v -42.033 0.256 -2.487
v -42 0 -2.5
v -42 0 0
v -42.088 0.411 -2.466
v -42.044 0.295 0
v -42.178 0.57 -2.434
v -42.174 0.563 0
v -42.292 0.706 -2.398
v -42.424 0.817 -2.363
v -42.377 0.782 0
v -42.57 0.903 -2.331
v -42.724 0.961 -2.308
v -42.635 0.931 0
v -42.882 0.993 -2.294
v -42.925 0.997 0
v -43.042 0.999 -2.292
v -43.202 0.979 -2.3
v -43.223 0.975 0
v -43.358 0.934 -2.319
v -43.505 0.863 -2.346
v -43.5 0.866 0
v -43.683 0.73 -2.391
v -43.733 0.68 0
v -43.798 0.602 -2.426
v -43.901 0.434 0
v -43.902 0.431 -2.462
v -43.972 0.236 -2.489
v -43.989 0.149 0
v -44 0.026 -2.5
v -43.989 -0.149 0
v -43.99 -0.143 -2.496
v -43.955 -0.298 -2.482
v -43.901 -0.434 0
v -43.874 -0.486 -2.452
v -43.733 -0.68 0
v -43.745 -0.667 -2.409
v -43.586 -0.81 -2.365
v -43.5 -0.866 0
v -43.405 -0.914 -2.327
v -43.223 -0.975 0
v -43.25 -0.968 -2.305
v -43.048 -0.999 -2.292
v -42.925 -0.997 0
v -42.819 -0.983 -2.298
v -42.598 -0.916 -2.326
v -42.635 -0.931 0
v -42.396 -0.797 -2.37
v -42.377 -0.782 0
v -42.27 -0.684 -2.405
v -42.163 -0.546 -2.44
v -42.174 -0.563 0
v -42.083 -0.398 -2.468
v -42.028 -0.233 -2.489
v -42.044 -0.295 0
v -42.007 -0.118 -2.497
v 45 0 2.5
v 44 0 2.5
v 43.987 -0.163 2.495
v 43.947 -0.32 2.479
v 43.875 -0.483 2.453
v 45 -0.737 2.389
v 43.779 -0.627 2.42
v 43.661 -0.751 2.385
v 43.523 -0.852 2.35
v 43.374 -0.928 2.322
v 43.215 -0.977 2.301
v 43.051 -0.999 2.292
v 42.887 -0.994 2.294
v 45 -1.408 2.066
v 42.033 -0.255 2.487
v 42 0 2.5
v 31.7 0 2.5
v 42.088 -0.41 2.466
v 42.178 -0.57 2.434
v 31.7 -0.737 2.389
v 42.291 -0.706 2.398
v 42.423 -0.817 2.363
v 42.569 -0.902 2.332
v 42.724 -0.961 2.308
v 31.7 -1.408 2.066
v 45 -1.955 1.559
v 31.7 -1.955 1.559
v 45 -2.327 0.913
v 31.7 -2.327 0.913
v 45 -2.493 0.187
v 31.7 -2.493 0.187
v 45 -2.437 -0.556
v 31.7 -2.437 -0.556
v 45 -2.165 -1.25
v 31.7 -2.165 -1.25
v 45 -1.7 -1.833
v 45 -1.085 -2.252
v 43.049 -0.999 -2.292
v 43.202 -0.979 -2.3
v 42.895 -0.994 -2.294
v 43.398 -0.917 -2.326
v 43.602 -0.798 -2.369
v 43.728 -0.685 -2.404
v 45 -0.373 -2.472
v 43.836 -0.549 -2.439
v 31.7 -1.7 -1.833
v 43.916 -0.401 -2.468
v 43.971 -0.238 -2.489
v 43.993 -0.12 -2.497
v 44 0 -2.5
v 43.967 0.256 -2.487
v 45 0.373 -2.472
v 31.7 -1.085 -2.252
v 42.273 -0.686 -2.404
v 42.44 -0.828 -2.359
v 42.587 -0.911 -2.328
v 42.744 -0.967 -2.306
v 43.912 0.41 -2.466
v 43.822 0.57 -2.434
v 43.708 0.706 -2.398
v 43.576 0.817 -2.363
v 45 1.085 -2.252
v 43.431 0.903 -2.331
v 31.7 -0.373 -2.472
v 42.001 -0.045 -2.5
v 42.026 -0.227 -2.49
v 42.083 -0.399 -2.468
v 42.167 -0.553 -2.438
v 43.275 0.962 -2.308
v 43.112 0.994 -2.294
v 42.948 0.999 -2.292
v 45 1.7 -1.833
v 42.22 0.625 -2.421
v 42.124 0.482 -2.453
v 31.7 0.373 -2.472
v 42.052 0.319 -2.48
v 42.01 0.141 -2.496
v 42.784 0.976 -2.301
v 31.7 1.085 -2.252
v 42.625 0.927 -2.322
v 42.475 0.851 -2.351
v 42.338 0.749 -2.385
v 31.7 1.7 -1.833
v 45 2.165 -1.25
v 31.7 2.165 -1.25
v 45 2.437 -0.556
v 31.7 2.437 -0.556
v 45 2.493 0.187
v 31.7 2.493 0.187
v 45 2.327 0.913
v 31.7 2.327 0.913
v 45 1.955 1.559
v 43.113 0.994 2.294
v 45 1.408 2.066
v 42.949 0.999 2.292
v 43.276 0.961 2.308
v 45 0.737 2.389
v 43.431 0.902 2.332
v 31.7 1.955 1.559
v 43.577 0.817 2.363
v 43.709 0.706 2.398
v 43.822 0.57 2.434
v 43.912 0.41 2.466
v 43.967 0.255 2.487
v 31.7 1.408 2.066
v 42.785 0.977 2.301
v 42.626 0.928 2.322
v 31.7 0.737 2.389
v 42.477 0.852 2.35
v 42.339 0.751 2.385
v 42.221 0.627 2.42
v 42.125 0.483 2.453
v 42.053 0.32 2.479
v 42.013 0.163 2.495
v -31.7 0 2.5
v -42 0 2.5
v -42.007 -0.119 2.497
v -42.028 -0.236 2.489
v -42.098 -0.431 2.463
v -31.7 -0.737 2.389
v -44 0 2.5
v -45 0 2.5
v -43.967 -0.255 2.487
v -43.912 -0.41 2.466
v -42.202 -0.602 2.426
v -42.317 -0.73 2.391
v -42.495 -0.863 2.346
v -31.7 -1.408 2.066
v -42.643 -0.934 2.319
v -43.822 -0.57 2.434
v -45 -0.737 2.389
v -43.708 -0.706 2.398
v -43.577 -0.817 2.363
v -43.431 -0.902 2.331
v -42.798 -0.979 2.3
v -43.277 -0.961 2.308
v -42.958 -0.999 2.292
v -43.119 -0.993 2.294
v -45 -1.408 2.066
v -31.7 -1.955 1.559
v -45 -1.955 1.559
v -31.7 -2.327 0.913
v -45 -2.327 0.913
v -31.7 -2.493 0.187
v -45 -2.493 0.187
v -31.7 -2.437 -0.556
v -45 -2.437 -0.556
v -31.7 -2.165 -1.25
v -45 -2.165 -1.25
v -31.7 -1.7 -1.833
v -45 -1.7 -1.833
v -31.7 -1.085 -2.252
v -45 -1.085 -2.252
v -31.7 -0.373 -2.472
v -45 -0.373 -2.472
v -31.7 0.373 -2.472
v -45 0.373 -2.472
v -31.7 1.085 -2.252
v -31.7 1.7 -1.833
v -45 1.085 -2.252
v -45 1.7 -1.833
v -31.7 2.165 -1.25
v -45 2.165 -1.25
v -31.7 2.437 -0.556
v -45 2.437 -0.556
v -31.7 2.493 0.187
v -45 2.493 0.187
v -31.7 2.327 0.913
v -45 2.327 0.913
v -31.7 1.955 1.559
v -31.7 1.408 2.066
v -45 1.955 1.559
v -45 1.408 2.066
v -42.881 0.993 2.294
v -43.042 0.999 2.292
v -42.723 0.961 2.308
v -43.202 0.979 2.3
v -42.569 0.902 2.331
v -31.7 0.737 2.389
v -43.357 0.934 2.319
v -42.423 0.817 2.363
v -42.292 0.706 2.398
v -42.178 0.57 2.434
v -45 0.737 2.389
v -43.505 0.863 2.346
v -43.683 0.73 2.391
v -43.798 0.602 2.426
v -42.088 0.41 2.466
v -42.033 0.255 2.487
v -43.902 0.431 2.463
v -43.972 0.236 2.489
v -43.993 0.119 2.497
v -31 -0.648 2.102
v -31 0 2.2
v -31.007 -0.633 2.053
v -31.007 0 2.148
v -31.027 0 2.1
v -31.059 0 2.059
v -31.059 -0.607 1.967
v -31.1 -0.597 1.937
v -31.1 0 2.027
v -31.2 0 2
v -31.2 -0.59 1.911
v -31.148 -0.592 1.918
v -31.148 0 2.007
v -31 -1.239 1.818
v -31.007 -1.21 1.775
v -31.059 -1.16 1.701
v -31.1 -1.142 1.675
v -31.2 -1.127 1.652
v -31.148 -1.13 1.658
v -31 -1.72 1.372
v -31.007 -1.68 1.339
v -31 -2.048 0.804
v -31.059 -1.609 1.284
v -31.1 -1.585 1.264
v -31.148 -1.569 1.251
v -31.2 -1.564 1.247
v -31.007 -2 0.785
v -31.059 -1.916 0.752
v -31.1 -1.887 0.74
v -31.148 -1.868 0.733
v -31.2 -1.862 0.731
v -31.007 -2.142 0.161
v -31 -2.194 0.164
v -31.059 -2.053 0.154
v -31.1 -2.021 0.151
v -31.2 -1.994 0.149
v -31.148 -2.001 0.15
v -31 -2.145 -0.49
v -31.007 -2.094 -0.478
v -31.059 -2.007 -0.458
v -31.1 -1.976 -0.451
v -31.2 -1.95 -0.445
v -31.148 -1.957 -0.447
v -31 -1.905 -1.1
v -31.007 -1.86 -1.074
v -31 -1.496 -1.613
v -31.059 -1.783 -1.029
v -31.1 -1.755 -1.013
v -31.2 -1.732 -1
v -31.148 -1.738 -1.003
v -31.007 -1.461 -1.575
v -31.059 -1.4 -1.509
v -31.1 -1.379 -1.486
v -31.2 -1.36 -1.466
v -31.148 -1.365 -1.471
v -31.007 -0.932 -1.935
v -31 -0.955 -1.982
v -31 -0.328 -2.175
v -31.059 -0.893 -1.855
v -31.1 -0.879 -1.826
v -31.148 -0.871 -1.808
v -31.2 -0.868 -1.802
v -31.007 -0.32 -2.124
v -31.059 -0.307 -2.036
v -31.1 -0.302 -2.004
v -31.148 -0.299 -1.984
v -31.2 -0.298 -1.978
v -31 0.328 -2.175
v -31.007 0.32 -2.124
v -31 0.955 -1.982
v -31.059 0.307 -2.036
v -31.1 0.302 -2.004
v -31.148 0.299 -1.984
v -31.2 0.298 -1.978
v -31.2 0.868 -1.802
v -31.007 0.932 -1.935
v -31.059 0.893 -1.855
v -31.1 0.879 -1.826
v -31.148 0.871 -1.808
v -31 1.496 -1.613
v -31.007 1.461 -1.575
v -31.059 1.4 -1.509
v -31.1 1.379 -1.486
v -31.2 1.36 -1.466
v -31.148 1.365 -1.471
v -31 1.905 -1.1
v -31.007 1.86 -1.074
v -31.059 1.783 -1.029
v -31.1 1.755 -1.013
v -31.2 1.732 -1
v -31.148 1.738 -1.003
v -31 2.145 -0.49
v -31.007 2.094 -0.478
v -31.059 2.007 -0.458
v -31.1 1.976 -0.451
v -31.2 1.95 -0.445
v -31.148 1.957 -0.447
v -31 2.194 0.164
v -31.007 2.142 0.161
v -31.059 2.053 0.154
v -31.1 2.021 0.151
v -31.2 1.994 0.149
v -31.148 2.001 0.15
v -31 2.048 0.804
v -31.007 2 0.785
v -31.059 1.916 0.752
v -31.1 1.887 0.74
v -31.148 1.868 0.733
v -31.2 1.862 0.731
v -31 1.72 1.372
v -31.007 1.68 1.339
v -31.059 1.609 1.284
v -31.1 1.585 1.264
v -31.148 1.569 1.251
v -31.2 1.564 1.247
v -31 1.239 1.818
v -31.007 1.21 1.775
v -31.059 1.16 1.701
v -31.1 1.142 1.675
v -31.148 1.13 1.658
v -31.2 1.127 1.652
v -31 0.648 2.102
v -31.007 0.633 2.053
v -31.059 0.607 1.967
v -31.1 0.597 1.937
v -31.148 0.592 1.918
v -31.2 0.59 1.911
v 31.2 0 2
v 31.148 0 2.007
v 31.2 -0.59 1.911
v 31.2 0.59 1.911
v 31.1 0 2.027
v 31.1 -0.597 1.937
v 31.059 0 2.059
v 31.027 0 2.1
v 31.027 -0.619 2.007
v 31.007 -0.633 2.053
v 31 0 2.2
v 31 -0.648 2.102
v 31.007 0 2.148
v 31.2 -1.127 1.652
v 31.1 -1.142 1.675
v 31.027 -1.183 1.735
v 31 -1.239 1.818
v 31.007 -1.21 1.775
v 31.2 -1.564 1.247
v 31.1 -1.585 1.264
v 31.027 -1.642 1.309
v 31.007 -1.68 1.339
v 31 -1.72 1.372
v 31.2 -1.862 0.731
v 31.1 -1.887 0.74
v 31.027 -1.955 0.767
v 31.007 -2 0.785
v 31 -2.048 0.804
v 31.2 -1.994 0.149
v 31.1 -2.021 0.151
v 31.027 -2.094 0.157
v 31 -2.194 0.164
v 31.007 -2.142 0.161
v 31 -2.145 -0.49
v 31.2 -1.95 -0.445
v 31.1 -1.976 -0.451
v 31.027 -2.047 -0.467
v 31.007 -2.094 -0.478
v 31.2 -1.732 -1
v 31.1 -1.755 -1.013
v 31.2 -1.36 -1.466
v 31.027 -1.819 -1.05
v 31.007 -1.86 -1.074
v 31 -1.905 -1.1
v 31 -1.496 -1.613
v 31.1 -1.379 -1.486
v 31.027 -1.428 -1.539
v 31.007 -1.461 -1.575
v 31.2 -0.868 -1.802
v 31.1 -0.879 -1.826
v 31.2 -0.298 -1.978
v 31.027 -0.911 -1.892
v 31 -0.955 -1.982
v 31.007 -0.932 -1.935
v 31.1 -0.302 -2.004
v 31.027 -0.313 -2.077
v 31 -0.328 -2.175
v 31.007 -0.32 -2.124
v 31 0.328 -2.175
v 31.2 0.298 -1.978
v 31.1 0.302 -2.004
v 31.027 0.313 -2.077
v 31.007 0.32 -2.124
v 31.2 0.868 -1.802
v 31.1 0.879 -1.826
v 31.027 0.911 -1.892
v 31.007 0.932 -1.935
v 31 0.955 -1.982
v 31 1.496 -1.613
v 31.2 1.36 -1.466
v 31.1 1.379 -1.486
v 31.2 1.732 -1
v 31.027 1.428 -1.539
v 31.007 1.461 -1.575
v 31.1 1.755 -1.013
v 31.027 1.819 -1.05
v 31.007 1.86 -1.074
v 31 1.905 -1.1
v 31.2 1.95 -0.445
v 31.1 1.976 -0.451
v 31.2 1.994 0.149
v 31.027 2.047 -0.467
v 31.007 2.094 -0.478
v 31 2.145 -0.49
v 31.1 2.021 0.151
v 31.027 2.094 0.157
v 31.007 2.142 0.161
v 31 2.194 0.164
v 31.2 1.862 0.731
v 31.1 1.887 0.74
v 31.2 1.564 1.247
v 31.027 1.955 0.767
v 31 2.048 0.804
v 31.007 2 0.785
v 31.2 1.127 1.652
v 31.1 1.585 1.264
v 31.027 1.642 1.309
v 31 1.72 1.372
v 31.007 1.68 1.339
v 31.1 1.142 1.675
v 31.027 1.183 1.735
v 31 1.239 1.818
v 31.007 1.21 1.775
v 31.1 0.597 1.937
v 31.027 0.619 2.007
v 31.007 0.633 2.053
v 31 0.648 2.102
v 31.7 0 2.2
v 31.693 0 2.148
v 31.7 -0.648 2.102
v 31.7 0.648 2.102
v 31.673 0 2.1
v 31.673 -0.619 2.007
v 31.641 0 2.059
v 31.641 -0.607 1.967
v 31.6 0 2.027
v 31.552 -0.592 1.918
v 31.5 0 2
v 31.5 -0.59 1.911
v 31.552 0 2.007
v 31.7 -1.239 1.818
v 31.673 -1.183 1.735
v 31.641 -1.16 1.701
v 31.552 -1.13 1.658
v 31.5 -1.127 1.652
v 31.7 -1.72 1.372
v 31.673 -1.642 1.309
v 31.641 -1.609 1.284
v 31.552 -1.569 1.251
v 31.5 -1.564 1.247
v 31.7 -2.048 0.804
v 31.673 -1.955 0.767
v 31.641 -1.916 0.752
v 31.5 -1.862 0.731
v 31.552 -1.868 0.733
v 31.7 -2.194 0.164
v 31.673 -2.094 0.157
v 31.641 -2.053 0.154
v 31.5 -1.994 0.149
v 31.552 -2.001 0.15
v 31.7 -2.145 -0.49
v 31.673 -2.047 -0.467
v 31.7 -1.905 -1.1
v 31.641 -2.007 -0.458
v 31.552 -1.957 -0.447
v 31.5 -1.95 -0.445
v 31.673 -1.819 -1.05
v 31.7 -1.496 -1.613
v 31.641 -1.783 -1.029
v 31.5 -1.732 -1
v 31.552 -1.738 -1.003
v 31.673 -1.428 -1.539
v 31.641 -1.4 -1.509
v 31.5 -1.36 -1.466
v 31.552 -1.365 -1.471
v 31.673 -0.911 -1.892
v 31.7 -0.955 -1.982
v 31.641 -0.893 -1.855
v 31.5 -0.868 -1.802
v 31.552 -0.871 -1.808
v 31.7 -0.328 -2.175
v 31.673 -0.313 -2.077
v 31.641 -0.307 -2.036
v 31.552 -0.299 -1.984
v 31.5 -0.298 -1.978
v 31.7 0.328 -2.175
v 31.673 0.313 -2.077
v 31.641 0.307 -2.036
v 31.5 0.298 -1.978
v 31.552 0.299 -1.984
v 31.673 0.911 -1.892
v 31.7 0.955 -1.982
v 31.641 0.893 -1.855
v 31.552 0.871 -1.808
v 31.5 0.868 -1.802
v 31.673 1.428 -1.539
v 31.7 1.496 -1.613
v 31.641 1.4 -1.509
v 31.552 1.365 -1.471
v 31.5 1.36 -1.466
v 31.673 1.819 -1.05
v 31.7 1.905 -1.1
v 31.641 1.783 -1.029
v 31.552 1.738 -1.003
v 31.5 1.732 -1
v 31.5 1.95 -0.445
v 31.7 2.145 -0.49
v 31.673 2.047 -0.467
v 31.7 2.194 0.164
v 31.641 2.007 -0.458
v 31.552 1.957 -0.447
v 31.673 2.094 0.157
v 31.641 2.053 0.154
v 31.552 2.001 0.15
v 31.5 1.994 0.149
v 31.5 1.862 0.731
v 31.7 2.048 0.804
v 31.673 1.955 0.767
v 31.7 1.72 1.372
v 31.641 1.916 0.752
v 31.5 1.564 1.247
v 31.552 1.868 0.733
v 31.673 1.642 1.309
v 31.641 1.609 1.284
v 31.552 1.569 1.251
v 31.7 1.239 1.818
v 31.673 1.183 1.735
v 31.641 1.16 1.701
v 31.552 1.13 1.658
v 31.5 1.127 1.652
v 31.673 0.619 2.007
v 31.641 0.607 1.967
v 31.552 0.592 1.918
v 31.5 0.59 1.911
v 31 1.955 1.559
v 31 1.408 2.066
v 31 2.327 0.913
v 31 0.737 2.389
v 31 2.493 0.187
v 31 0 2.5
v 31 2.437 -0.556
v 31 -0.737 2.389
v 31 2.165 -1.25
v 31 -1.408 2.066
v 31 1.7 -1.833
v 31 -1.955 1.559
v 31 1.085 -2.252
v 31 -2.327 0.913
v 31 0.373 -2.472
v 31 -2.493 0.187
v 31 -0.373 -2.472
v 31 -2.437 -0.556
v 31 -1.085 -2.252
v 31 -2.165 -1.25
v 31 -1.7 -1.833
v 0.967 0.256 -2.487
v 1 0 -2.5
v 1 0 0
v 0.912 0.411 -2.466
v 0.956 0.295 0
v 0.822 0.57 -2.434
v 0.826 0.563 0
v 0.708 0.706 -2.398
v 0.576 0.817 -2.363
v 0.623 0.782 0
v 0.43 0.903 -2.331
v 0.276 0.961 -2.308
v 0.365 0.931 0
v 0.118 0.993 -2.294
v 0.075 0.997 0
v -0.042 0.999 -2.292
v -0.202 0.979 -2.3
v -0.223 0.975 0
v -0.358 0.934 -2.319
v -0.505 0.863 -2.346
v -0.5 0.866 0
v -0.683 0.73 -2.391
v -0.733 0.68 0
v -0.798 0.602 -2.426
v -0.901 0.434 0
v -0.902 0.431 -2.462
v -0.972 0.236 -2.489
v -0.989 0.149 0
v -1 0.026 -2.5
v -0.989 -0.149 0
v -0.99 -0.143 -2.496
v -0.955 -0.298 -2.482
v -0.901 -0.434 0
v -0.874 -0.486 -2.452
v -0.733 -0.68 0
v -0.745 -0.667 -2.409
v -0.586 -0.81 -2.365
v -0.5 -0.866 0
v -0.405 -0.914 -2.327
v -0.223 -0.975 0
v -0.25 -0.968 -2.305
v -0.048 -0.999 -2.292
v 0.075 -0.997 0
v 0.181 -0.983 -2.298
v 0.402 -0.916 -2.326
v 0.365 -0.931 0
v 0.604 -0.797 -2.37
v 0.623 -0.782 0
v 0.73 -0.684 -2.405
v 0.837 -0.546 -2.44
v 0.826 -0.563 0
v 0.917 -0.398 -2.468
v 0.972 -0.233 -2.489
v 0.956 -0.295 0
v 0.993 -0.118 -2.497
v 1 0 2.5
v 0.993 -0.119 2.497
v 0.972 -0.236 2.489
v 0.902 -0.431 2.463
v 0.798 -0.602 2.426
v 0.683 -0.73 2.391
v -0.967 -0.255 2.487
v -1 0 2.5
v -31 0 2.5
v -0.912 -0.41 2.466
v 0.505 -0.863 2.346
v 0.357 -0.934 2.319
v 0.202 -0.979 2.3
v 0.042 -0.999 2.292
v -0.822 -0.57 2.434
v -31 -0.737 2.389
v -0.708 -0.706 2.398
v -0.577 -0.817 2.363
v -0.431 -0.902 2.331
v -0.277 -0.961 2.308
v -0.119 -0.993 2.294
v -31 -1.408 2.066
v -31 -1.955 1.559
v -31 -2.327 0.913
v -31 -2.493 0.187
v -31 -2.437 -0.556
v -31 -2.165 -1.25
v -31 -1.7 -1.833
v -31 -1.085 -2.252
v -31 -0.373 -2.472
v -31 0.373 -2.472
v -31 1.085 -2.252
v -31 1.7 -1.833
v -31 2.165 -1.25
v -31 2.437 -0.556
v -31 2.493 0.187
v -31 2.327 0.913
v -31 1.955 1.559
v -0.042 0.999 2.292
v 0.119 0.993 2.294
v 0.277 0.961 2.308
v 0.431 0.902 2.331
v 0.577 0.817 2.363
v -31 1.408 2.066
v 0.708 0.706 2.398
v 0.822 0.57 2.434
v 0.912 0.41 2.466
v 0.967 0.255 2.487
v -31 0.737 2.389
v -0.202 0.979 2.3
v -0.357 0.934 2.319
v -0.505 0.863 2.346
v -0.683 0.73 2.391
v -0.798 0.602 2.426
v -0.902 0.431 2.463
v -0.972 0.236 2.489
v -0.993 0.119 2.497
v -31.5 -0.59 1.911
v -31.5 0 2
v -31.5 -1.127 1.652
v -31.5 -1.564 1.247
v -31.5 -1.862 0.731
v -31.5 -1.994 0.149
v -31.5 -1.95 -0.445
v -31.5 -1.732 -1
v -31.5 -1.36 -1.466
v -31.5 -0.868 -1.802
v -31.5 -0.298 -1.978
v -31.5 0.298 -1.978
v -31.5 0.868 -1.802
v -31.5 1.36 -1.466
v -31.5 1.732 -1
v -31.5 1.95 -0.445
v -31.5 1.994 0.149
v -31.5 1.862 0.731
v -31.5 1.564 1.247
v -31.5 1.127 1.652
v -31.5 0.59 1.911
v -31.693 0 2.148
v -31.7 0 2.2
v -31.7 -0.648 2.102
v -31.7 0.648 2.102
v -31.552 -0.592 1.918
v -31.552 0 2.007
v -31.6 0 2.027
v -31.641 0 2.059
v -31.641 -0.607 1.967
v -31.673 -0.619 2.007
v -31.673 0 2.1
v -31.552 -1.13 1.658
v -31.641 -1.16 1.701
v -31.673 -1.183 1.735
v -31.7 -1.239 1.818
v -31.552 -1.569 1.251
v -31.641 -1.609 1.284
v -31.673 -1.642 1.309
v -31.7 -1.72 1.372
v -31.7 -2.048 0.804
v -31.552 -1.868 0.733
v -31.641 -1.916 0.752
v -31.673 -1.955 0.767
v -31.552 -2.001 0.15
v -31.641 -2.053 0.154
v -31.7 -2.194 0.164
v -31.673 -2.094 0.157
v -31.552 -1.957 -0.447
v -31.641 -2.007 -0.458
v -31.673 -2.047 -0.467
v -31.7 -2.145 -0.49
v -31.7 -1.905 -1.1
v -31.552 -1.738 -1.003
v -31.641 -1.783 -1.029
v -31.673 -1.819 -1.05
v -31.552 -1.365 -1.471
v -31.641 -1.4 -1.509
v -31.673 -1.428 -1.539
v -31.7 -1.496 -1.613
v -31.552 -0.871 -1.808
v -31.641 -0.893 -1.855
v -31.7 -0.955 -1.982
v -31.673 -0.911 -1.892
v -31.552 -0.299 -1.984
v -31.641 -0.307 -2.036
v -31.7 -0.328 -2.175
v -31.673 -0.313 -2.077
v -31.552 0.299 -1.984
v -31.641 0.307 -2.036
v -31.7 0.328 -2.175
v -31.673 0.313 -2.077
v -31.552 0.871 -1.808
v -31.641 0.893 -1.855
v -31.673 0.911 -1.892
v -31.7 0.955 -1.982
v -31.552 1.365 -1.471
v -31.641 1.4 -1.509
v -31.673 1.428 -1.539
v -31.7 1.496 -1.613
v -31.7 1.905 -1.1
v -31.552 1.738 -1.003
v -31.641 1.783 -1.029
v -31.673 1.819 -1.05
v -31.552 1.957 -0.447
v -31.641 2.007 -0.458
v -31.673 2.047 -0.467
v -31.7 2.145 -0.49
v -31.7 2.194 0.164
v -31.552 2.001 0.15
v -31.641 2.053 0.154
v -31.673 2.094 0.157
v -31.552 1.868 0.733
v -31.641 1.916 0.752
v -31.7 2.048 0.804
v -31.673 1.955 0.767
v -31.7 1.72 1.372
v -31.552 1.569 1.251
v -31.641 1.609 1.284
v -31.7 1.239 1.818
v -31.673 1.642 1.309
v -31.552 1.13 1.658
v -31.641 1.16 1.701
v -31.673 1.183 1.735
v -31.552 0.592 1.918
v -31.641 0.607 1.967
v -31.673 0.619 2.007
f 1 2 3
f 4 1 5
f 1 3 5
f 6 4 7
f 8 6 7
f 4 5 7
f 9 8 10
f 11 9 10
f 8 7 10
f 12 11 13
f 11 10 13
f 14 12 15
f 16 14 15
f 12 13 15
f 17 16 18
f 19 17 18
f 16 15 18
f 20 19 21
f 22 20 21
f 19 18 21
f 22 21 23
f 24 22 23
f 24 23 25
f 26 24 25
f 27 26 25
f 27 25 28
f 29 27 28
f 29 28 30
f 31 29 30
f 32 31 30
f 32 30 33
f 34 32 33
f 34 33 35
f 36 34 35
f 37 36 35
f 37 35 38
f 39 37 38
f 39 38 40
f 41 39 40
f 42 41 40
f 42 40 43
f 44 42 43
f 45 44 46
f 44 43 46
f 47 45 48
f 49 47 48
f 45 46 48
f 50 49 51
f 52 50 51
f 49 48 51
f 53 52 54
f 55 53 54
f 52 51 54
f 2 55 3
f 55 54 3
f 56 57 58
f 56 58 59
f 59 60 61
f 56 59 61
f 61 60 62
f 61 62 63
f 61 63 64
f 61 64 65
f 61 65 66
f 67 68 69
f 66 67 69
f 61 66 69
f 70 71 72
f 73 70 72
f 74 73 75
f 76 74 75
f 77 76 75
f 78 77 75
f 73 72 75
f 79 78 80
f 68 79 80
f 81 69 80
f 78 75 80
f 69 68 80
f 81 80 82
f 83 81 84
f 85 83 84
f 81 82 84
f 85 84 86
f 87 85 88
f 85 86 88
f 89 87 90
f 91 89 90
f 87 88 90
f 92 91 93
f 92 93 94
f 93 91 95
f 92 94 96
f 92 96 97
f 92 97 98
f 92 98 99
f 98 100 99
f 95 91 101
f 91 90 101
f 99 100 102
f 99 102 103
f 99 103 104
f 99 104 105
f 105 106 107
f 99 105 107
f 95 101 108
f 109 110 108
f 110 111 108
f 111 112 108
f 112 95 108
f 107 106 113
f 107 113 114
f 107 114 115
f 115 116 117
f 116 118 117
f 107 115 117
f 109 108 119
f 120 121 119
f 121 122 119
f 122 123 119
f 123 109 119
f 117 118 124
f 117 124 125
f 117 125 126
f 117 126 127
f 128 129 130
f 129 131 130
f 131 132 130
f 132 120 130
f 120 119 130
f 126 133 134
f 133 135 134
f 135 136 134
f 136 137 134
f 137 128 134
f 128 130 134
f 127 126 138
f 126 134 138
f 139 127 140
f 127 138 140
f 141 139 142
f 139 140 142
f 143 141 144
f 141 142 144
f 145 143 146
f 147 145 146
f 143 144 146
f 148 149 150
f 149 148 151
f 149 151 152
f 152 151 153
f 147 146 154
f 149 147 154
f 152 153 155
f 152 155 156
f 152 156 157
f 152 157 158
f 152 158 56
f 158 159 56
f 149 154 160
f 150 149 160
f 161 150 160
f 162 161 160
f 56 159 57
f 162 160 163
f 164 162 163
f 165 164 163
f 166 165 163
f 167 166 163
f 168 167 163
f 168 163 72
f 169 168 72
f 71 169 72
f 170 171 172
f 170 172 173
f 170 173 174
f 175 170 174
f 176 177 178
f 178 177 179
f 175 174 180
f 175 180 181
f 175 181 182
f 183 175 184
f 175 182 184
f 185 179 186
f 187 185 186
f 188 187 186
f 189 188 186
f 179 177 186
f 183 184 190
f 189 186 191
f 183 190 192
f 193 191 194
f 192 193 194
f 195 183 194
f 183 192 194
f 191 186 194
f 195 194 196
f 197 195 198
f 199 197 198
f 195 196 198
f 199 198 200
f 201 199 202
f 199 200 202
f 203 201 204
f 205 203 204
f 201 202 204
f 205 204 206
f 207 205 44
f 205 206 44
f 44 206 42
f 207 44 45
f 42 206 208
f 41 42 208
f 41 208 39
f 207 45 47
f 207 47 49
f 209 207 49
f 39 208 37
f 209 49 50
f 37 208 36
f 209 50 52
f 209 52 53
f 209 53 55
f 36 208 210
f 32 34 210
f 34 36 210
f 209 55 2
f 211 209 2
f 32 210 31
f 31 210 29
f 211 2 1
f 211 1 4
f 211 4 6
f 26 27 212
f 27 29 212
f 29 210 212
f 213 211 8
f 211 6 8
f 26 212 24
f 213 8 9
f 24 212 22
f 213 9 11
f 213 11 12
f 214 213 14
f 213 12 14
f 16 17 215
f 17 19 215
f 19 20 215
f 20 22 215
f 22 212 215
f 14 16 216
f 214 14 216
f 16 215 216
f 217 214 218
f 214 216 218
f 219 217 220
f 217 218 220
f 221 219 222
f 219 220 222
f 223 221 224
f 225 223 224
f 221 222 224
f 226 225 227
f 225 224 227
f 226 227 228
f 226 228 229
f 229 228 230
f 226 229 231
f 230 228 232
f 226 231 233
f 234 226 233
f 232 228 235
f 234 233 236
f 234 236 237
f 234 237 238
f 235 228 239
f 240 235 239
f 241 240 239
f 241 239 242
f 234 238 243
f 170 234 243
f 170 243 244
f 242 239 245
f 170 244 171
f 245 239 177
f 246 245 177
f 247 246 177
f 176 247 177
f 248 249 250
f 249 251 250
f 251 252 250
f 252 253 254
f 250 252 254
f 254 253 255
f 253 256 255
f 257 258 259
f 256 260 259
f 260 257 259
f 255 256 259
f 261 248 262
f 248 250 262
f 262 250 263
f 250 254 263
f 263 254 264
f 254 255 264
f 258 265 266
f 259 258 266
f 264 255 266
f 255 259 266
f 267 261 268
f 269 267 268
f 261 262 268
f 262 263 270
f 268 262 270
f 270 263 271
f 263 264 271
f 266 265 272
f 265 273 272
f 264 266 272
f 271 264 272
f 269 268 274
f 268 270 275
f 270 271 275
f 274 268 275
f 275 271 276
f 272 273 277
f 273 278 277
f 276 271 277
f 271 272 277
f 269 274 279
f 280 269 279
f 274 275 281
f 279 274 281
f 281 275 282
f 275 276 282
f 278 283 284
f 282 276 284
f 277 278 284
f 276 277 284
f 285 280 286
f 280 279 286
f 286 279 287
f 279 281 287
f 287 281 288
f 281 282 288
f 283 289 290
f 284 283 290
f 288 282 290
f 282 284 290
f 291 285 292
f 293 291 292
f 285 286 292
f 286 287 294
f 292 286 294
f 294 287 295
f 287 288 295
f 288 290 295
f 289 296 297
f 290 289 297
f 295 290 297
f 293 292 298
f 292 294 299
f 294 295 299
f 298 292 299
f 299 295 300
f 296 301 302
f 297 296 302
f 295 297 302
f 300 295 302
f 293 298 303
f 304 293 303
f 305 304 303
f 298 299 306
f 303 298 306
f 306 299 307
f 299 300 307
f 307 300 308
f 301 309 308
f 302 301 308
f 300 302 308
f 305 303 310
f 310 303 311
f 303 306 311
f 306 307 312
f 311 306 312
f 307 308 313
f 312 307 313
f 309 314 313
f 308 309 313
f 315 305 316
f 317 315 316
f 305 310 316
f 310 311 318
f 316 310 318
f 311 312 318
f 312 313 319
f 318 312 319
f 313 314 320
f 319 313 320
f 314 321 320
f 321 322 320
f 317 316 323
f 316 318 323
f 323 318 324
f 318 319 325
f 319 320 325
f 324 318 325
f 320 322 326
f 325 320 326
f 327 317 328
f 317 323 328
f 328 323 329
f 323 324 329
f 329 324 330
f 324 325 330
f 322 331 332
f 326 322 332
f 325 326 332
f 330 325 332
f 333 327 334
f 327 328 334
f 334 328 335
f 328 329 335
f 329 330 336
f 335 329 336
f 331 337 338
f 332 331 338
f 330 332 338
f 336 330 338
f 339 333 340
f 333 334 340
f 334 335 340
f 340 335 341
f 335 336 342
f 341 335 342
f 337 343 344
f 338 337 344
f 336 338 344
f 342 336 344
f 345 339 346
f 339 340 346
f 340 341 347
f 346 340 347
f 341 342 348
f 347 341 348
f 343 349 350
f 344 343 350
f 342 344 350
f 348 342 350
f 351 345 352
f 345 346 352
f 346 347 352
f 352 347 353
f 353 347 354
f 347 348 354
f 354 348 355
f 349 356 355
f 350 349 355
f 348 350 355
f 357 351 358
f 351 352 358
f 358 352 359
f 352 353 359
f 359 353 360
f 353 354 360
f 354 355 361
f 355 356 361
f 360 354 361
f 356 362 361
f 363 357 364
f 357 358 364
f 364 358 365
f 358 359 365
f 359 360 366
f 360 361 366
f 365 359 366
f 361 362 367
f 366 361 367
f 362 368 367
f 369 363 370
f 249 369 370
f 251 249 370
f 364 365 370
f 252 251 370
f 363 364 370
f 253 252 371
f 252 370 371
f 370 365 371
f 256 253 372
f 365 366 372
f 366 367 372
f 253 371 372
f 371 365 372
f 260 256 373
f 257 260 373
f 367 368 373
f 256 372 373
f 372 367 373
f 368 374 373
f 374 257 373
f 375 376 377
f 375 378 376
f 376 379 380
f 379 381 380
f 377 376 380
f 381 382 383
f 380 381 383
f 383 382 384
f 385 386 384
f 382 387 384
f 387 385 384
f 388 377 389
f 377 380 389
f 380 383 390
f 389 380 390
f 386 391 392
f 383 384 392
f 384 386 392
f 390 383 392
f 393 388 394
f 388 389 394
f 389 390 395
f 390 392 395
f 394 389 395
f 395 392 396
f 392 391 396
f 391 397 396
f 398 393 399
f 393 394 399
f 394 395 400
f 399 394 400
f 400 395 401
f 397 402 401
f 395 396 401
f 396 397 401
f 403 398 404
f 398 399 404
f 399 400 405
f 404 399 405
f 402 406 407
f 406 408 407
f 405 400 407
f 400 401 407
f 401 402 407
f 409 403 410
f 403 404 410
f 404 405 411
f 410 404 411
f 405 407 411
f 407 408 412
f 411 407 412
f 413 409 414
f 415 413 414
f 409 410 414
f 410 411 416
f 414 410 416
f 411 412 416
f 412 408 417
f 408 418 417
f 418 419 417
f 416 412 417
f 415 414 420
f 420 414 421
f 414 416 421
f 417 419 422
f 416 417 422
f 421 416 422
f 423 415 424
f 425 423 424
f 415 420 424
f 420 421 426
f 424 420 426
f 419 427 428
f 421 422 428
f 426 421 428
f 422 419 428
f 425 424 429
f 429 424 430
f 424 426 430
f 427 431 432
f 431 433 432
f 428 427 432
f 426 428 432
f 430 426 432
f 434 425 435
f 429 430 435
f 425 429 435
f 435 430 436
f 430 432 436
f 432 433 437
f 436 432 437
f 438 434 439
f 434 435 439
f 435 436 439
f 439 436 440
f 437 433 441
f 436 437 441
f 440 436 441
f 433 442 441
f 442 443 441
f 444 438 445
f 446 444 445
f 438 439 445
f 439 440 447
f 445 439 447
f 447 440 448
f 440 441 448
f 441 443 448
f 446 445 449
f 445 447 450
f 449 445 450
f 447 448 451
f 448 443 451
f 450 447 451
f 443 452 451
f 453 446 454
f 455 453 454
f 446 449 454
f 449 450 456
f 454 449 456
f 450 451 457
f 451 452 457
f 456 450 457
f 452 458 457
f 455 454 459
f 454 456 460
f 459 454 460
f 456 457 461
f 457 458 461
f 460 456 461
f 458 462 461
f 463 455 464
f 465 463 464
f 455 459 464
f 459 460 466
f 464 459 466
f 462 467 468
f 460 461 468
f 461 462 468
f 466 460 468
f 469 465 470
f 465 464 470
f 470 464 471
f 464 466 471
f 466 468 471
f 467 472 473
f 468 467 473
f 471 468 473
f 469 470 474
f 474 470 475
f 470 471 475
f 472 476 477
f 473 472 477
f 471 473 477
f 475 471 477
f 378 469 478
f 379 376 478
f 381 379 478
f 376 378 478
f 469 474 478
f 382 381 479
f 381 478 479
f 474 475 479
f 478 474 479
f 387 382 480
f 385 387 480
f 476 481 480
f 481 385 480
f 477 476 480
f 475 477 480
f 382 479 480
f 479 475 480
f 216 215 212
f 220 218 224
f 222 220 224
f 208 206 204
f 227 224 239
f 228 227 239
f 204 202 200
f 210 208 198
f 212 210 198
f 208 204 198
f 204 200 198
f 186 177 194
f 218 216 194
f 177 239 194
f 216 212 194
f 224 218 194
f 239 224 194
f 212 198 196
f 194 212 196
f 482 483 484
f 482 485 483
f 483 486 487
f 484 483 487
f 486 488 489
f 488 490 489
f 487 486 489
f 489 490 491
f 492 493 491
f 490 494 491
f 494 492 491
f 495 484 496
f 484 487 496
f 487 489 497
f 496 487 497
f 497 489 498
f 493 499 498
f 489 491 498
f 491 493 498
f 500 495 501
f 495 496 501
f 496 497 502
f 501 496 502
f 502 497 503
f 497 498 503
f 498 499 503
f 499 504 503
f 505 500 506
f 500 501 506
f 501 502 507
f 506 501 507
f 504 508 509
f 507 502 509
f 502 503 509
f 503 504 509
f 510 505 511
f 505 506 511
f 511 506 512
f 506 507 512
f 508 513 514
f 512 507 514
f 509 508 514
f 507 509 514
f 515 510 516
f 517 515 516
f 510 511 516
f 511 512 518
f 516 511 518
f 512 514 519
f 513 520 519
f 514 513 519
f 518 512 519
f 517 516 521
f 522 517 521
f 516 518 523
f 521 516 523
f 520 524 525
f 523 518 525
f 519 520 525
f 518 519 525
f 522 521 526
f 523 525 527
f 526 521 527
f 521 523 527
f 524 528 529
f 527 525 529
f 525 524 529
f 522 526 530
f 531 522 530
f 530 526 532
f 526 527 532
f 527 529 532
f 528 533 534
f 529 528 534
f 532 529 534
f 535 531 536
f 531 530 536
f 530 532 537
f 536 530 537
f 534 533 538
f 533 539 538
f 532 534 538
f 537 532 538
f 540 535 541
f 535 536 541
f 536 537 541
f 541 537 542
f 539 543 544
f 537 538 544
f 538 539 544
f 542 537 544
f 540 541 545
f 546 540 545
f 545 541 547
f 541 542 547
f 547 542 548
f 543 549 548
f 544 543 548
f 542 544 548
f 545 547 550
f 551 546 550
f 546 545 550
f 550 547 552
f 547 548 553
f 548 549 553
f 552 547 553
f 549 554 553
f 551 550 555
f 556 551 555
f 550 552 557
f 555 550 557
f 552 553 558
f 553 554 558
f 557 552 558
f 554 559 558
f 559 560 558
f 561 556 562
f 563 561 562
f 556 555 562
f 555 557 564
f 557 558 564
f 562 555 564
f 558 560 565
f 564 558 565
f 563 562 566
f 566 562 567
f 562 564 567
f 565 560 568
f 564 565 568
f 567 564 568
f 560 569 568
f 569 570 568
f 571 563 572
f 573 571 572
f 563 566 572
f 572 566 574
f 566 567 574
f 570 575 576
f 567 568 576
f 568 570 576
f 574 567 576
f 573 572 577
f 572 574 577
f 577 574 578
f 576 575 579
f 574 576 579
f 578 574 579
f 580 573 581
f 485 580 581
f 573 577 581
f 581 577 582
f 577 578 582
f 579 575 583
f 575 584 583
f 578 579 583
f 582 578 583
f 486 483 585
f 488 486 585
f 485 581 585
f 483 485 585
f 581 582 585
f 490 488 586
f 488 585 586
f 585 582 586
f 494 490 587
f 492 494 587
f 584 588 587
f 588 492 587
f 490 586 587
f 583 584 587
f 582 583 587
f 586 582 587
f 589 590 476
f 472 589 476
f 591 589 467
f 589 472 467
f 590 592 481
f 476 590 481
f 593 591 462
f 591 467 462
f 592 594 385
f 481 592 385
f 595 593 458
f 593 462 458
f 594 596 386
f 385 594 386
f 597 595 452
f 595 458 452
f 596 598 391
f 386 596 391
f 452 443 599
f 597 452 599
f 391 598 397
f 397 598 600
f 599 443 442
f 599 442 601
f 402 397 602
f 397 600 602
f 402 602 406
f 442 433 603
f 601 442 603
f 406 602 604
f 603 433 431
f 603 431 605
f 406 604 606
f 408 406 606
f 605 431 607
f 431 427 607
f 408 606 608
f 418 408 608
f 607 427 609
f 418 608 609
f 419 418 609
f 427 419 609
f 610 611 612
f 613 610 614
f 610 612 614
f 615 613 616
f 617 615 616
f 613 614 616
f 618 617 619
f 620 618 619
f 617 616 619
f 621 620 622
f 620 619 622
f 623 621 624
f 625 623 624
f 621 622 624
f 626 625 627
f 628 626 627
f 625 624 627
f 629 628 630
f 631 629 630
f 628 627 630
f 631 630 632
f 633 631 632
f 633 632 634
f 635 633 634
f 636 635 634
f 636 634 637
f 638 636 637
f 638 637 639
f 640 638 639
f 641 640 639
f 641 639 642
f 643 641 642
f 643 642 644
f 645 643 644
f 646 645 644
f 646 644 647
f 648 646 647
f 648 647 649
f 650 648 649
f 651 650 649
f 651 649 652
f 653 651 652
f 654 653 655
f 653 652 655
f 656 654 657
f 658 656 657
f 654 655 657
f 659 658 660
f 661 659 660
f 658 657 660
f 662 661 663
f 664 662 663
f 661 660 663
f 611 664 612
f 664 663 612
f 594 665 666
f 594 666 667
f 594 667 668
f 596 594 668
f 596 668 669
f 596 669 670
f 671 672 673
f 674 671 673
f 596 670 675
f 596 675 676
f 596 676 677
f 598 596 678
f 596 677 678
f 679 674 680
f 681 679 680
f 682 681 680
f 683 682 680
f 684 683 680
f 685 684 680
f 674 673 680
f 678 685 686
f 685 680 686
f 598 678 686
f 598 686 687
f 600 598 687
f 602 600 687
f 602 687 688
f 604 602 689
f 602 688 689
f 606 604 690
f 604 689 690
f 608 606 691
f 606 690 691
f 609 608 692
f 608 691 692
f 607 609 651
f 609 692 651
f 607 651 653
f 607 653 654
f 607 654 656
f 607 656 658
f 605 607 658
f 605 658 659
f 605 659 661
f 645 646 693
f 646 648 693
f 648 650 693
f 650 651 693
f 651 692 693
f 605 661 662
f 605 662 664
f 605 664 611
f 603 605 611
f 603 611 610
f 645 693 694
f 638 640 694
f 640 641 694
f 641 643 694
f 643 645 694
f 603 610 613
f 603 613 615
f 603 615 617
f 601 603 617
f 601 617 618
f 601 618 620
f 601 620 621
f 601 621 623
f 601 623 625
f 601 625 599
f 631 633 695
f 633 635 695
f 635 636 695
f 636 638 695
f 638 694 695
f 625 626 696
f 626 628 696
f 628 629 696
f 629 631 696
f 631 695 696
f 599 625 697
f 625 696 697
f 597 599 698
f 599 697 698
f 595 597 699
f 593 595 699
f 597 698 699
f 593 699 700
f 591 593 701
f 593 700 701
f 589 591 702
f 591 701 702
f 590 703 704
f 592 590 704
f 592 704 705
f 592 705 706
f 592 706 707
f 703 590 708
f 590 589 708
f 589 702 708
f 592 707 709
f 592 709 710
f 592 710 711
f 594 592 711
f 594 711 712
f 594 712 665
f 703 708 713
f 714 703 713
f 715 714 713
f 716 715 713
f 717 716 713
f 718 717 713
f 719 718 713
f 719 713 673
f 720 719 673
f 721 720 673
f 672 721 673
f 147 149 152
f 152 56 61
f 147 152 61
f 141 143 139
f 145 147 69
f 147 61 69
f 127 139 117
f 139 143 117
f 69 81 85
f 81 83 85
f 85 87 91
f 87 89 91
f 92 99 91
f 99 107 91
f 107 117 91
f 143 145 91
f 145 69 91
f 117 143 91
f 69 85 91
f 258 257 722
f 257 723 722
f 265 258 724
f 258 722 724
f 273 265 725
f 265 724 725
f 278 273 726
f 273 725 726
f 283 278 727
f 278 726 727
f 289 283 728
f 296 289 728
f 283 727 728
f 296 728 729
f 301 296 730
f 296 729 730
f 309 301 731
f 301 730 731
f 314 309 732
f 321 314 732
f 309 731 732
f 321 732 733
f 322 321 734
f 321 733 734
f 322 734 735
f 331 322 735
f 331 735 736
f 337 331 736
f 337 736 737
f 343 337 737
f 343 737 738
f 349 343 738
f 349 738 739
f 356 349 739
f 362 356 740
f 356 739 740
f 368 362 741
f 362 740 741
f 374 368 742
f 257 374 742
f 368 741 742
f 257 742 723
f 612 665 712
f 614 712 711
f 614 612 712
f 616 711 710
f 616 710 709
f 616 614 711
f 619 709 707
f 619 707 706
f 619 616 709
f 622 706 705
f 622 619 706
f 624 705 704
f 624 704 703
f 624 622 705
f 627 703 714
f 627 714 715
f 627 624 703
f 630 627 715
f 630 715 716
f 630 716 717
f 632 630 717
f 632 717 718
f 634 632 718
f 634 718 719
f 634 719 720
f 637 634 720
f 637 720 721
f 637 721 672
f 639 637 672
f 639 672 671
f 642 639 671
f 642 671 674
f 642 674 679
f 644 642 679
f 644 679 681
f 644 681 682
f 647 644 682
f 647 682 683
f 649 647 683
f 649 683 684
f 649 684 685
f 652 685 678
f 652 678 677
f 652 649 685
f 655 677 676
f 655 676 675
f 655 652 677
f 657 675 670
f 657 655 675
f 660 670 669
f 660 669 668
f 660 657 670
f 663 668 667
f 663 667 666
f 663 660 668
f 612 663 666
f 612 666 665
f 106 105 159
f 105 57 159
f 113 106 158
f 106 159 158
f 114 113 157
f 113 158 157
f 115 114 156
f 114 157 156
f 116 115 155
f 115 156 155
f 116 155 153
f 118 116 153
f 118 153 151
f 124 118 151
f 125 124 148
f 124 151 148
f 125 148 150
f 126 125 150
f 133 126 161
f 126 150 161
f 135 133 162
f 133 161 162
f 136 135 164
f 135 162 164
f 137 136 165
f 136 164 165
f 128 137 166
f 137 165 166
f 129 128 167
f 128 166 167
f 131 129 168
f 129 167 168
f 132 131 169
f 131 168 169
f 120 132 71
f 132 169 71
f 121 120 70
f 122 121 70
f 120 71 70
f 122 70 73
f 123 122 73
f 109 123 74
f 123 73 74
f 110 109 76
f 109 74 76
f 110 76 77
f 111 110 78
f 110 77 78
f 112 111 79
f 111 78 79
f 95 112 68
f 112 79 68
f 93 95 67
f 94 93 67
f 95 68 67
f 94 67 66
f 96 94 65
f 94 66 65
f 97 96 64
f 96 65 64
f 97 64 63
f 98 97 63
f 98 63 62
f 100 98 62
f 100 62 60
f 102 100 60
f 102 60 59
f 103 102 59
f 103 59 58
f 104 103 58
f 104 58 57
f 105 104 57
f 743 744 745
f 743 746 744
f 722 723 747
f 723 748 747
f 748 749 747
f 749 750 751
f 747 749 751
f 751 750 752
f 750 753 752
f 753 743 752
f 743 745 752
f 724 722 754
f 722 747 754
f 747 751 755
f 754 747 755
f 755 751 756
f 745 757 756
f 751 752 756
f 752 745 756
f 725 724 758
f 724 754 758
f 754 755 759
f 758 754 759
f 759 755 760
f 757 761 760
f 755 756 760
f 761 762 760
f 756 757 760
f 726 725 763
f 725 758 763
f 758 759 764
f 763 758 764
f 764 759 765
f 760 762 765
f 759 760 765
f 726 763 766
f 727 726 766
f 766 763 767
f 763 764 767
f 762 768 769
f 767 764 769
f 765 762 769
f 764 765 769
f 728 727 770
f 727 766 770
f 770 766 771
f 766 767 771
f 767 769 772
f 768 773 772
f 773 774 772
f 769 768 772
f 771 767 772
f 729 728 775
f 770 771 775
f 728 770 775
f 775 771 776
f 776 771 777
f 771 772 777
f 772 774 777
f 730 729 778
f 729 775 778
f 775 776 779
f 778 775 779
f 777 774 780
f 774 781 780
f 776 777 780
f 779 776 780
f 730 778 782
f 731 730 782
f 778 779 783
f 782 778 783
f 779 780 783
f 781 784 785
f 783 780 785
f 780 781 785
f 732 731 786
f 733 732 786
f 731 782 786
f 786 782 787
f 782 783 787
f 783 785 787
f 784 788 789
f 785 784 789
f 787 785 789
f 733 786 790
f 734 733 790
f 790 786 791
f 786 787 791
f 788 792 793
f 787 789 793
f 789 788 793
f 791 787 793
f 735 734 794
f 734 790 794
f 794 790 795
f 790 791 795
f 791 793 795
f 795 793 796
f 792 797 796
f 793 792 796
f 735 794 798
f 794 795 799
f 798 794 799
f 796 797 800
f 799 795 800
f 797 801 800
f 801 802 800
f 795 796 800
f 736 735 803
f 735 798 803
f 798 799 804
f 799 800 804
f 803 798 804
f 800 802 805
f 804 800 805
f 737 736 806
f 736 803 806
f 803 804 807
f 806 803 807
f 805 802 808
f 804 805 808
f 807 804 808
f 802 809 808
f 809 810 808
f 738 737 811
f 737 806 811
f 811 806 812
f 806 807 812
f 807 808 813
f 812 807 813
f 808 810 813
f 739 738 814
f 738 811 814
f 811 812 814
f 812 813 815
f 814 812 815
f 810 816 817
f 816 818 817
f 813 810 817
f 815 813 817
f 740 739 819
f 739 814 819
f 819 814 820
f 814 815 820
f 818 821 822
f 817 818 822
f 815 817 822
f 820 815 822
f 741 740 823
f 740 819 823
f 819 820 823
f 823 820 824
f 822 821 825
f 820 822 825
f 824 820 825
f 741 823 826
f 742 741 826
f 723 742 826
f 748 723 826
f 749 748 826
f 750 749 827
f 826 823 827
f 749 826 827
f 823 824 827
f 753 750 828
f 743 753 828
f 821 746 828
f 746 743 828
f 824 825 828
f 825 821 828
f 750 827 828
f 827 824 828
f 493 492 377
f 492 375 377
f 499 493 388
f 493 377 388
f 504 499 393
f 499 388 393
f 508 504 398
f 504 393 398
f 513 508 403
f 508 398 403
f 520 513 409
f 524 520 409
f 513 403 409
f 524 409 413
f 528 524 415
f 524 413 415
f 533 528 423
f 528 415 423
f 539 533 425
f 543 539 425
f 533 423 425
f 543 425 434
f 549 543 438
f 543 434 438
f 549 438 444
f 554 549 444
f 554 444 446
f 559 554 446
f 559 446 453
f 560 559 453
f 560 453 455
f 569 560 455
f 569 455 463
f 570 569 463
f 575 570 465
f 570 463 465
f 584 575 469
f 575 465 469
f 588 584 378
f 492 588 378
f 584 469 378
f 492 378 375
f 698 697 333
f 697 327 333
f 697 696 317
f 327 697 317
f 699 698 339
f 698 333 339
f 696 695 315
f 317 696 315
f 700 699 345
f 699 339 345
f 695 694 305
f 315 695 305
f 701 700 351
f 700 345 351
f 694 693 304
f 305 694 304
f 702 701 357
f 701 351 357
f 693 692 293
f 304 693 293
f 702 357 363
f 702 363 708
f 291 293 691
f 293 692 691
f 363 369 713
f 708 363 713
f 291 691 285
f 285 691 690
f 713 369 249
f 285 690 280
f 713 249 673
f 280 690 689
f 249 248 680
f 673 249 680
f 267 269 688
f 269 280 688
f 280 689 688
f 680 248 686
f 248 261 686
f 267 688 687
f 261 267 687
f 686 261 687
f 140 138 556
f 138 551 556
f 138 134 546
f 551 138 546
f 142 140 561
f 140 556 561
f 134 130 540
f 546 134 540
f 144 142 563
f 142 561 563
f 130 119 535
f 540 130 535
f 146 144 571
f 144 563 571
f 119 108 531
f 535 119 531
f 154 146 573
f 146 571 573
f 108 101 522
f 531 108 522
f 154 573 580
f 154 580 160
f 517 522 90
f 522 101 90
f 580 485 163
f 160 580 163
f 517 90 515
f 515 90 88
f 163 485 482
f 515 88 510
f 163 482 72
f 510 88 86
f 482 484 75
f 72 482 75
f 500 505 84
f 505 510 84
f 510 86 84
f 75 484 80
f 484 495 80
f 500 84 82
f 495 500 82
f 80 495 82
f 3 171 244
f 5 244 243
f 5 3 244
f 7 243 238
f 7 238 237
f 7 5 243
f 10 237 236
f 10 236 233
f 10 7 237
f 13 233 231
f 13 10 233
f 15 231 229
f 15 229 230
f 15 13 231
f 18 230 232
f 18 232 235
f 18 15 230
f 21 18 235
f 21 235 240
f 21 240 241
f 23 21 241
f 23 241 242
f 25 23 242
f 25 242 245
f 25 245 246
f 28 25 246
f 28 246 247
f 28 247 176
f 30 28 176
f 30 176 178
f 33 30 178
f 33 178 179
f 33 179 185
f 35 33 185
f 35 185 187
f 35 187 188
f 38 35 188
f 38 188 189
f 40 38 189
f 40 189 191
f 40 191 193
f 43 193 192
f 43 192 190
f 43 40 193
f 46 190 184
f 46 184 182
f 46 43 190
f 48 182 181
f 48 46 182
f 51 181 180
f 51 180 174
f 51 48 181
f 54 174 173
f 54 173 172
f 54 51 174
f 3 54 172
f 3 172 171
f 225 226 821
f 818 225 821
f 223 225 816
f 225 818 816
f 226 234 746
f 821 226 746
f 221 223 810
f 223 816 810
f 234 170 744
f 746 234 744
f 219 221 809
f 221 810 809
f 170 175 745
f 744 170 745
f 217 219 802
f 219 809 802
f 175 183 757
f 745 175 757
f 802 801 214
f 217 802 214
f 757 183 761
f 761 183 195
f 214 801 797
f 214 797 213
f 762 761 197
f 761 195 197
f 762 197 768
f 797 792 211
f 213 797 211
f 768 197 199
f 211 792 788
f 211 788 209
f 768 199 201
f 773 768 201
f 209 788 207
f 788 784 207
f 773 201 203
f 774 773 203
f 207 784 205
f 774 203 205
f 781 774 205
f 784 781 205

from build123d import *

# Parameters (mm, degrees)
F2_R     = 1
F3_DEPTH = 12.5


with BuildPart() as f1:
    # F0 (on Front) → F1 (revolve)
    with BuildSketch(Plane.XZ):
        with BuildLine():
            Line((-31.7, 2.5), (-45, 2.5))
            Line((-45, 2.5), (-45, 0))
            Line((-45, 0), (45, 0))
            Line((45, 0), (45, 2.5))
            Line((45, 2.5), (31.7, 2.5))
            Line((31.7, 2.5), (31.7, 2.2))
            ThreePointArc((31.7, 2.2), (31.641421, 2.058579), (31.5, 2))
            Line((31.5, 2), (31.2, 2))
            ThreePointArc((31.2, 2), (31.058579, 2.058579), (31, 2.2))
            Line((31, 2.2), (31, 2.5))
            Line((31, 2.5), (-31, 2.5))
            Line((-31, 2.5), (-31, 2.2))
            ThreePointArc((-31, 2.2), (-31.058579, 2.058579), (-31.2, 2))
            Line((-31.2, 2), (-31.5, 2))
            ThreePointArc((-31.5, 2), (-31.641421, 2.058579), (-31.7, 2.2))
            Line((-31.7, 2.2), (-31.7, 2.5))
        make_face()
    revolve(axis=Axis((0, 0, 0), (1, 0, 0)))

    # F2 (on Top) → F3 (cut, symmetric)
    with BuildSketch(Plane.XY):
        with Locations((-43, 0)):
            Circle(F2_R)
        Circle(F2_R)
        with Locations((43, 0)):
            Circle(F2_R)
    extrude(amount=F3_DEPTH, both=True, mode=Mode.SUBTRACT)


solid = f1.part
